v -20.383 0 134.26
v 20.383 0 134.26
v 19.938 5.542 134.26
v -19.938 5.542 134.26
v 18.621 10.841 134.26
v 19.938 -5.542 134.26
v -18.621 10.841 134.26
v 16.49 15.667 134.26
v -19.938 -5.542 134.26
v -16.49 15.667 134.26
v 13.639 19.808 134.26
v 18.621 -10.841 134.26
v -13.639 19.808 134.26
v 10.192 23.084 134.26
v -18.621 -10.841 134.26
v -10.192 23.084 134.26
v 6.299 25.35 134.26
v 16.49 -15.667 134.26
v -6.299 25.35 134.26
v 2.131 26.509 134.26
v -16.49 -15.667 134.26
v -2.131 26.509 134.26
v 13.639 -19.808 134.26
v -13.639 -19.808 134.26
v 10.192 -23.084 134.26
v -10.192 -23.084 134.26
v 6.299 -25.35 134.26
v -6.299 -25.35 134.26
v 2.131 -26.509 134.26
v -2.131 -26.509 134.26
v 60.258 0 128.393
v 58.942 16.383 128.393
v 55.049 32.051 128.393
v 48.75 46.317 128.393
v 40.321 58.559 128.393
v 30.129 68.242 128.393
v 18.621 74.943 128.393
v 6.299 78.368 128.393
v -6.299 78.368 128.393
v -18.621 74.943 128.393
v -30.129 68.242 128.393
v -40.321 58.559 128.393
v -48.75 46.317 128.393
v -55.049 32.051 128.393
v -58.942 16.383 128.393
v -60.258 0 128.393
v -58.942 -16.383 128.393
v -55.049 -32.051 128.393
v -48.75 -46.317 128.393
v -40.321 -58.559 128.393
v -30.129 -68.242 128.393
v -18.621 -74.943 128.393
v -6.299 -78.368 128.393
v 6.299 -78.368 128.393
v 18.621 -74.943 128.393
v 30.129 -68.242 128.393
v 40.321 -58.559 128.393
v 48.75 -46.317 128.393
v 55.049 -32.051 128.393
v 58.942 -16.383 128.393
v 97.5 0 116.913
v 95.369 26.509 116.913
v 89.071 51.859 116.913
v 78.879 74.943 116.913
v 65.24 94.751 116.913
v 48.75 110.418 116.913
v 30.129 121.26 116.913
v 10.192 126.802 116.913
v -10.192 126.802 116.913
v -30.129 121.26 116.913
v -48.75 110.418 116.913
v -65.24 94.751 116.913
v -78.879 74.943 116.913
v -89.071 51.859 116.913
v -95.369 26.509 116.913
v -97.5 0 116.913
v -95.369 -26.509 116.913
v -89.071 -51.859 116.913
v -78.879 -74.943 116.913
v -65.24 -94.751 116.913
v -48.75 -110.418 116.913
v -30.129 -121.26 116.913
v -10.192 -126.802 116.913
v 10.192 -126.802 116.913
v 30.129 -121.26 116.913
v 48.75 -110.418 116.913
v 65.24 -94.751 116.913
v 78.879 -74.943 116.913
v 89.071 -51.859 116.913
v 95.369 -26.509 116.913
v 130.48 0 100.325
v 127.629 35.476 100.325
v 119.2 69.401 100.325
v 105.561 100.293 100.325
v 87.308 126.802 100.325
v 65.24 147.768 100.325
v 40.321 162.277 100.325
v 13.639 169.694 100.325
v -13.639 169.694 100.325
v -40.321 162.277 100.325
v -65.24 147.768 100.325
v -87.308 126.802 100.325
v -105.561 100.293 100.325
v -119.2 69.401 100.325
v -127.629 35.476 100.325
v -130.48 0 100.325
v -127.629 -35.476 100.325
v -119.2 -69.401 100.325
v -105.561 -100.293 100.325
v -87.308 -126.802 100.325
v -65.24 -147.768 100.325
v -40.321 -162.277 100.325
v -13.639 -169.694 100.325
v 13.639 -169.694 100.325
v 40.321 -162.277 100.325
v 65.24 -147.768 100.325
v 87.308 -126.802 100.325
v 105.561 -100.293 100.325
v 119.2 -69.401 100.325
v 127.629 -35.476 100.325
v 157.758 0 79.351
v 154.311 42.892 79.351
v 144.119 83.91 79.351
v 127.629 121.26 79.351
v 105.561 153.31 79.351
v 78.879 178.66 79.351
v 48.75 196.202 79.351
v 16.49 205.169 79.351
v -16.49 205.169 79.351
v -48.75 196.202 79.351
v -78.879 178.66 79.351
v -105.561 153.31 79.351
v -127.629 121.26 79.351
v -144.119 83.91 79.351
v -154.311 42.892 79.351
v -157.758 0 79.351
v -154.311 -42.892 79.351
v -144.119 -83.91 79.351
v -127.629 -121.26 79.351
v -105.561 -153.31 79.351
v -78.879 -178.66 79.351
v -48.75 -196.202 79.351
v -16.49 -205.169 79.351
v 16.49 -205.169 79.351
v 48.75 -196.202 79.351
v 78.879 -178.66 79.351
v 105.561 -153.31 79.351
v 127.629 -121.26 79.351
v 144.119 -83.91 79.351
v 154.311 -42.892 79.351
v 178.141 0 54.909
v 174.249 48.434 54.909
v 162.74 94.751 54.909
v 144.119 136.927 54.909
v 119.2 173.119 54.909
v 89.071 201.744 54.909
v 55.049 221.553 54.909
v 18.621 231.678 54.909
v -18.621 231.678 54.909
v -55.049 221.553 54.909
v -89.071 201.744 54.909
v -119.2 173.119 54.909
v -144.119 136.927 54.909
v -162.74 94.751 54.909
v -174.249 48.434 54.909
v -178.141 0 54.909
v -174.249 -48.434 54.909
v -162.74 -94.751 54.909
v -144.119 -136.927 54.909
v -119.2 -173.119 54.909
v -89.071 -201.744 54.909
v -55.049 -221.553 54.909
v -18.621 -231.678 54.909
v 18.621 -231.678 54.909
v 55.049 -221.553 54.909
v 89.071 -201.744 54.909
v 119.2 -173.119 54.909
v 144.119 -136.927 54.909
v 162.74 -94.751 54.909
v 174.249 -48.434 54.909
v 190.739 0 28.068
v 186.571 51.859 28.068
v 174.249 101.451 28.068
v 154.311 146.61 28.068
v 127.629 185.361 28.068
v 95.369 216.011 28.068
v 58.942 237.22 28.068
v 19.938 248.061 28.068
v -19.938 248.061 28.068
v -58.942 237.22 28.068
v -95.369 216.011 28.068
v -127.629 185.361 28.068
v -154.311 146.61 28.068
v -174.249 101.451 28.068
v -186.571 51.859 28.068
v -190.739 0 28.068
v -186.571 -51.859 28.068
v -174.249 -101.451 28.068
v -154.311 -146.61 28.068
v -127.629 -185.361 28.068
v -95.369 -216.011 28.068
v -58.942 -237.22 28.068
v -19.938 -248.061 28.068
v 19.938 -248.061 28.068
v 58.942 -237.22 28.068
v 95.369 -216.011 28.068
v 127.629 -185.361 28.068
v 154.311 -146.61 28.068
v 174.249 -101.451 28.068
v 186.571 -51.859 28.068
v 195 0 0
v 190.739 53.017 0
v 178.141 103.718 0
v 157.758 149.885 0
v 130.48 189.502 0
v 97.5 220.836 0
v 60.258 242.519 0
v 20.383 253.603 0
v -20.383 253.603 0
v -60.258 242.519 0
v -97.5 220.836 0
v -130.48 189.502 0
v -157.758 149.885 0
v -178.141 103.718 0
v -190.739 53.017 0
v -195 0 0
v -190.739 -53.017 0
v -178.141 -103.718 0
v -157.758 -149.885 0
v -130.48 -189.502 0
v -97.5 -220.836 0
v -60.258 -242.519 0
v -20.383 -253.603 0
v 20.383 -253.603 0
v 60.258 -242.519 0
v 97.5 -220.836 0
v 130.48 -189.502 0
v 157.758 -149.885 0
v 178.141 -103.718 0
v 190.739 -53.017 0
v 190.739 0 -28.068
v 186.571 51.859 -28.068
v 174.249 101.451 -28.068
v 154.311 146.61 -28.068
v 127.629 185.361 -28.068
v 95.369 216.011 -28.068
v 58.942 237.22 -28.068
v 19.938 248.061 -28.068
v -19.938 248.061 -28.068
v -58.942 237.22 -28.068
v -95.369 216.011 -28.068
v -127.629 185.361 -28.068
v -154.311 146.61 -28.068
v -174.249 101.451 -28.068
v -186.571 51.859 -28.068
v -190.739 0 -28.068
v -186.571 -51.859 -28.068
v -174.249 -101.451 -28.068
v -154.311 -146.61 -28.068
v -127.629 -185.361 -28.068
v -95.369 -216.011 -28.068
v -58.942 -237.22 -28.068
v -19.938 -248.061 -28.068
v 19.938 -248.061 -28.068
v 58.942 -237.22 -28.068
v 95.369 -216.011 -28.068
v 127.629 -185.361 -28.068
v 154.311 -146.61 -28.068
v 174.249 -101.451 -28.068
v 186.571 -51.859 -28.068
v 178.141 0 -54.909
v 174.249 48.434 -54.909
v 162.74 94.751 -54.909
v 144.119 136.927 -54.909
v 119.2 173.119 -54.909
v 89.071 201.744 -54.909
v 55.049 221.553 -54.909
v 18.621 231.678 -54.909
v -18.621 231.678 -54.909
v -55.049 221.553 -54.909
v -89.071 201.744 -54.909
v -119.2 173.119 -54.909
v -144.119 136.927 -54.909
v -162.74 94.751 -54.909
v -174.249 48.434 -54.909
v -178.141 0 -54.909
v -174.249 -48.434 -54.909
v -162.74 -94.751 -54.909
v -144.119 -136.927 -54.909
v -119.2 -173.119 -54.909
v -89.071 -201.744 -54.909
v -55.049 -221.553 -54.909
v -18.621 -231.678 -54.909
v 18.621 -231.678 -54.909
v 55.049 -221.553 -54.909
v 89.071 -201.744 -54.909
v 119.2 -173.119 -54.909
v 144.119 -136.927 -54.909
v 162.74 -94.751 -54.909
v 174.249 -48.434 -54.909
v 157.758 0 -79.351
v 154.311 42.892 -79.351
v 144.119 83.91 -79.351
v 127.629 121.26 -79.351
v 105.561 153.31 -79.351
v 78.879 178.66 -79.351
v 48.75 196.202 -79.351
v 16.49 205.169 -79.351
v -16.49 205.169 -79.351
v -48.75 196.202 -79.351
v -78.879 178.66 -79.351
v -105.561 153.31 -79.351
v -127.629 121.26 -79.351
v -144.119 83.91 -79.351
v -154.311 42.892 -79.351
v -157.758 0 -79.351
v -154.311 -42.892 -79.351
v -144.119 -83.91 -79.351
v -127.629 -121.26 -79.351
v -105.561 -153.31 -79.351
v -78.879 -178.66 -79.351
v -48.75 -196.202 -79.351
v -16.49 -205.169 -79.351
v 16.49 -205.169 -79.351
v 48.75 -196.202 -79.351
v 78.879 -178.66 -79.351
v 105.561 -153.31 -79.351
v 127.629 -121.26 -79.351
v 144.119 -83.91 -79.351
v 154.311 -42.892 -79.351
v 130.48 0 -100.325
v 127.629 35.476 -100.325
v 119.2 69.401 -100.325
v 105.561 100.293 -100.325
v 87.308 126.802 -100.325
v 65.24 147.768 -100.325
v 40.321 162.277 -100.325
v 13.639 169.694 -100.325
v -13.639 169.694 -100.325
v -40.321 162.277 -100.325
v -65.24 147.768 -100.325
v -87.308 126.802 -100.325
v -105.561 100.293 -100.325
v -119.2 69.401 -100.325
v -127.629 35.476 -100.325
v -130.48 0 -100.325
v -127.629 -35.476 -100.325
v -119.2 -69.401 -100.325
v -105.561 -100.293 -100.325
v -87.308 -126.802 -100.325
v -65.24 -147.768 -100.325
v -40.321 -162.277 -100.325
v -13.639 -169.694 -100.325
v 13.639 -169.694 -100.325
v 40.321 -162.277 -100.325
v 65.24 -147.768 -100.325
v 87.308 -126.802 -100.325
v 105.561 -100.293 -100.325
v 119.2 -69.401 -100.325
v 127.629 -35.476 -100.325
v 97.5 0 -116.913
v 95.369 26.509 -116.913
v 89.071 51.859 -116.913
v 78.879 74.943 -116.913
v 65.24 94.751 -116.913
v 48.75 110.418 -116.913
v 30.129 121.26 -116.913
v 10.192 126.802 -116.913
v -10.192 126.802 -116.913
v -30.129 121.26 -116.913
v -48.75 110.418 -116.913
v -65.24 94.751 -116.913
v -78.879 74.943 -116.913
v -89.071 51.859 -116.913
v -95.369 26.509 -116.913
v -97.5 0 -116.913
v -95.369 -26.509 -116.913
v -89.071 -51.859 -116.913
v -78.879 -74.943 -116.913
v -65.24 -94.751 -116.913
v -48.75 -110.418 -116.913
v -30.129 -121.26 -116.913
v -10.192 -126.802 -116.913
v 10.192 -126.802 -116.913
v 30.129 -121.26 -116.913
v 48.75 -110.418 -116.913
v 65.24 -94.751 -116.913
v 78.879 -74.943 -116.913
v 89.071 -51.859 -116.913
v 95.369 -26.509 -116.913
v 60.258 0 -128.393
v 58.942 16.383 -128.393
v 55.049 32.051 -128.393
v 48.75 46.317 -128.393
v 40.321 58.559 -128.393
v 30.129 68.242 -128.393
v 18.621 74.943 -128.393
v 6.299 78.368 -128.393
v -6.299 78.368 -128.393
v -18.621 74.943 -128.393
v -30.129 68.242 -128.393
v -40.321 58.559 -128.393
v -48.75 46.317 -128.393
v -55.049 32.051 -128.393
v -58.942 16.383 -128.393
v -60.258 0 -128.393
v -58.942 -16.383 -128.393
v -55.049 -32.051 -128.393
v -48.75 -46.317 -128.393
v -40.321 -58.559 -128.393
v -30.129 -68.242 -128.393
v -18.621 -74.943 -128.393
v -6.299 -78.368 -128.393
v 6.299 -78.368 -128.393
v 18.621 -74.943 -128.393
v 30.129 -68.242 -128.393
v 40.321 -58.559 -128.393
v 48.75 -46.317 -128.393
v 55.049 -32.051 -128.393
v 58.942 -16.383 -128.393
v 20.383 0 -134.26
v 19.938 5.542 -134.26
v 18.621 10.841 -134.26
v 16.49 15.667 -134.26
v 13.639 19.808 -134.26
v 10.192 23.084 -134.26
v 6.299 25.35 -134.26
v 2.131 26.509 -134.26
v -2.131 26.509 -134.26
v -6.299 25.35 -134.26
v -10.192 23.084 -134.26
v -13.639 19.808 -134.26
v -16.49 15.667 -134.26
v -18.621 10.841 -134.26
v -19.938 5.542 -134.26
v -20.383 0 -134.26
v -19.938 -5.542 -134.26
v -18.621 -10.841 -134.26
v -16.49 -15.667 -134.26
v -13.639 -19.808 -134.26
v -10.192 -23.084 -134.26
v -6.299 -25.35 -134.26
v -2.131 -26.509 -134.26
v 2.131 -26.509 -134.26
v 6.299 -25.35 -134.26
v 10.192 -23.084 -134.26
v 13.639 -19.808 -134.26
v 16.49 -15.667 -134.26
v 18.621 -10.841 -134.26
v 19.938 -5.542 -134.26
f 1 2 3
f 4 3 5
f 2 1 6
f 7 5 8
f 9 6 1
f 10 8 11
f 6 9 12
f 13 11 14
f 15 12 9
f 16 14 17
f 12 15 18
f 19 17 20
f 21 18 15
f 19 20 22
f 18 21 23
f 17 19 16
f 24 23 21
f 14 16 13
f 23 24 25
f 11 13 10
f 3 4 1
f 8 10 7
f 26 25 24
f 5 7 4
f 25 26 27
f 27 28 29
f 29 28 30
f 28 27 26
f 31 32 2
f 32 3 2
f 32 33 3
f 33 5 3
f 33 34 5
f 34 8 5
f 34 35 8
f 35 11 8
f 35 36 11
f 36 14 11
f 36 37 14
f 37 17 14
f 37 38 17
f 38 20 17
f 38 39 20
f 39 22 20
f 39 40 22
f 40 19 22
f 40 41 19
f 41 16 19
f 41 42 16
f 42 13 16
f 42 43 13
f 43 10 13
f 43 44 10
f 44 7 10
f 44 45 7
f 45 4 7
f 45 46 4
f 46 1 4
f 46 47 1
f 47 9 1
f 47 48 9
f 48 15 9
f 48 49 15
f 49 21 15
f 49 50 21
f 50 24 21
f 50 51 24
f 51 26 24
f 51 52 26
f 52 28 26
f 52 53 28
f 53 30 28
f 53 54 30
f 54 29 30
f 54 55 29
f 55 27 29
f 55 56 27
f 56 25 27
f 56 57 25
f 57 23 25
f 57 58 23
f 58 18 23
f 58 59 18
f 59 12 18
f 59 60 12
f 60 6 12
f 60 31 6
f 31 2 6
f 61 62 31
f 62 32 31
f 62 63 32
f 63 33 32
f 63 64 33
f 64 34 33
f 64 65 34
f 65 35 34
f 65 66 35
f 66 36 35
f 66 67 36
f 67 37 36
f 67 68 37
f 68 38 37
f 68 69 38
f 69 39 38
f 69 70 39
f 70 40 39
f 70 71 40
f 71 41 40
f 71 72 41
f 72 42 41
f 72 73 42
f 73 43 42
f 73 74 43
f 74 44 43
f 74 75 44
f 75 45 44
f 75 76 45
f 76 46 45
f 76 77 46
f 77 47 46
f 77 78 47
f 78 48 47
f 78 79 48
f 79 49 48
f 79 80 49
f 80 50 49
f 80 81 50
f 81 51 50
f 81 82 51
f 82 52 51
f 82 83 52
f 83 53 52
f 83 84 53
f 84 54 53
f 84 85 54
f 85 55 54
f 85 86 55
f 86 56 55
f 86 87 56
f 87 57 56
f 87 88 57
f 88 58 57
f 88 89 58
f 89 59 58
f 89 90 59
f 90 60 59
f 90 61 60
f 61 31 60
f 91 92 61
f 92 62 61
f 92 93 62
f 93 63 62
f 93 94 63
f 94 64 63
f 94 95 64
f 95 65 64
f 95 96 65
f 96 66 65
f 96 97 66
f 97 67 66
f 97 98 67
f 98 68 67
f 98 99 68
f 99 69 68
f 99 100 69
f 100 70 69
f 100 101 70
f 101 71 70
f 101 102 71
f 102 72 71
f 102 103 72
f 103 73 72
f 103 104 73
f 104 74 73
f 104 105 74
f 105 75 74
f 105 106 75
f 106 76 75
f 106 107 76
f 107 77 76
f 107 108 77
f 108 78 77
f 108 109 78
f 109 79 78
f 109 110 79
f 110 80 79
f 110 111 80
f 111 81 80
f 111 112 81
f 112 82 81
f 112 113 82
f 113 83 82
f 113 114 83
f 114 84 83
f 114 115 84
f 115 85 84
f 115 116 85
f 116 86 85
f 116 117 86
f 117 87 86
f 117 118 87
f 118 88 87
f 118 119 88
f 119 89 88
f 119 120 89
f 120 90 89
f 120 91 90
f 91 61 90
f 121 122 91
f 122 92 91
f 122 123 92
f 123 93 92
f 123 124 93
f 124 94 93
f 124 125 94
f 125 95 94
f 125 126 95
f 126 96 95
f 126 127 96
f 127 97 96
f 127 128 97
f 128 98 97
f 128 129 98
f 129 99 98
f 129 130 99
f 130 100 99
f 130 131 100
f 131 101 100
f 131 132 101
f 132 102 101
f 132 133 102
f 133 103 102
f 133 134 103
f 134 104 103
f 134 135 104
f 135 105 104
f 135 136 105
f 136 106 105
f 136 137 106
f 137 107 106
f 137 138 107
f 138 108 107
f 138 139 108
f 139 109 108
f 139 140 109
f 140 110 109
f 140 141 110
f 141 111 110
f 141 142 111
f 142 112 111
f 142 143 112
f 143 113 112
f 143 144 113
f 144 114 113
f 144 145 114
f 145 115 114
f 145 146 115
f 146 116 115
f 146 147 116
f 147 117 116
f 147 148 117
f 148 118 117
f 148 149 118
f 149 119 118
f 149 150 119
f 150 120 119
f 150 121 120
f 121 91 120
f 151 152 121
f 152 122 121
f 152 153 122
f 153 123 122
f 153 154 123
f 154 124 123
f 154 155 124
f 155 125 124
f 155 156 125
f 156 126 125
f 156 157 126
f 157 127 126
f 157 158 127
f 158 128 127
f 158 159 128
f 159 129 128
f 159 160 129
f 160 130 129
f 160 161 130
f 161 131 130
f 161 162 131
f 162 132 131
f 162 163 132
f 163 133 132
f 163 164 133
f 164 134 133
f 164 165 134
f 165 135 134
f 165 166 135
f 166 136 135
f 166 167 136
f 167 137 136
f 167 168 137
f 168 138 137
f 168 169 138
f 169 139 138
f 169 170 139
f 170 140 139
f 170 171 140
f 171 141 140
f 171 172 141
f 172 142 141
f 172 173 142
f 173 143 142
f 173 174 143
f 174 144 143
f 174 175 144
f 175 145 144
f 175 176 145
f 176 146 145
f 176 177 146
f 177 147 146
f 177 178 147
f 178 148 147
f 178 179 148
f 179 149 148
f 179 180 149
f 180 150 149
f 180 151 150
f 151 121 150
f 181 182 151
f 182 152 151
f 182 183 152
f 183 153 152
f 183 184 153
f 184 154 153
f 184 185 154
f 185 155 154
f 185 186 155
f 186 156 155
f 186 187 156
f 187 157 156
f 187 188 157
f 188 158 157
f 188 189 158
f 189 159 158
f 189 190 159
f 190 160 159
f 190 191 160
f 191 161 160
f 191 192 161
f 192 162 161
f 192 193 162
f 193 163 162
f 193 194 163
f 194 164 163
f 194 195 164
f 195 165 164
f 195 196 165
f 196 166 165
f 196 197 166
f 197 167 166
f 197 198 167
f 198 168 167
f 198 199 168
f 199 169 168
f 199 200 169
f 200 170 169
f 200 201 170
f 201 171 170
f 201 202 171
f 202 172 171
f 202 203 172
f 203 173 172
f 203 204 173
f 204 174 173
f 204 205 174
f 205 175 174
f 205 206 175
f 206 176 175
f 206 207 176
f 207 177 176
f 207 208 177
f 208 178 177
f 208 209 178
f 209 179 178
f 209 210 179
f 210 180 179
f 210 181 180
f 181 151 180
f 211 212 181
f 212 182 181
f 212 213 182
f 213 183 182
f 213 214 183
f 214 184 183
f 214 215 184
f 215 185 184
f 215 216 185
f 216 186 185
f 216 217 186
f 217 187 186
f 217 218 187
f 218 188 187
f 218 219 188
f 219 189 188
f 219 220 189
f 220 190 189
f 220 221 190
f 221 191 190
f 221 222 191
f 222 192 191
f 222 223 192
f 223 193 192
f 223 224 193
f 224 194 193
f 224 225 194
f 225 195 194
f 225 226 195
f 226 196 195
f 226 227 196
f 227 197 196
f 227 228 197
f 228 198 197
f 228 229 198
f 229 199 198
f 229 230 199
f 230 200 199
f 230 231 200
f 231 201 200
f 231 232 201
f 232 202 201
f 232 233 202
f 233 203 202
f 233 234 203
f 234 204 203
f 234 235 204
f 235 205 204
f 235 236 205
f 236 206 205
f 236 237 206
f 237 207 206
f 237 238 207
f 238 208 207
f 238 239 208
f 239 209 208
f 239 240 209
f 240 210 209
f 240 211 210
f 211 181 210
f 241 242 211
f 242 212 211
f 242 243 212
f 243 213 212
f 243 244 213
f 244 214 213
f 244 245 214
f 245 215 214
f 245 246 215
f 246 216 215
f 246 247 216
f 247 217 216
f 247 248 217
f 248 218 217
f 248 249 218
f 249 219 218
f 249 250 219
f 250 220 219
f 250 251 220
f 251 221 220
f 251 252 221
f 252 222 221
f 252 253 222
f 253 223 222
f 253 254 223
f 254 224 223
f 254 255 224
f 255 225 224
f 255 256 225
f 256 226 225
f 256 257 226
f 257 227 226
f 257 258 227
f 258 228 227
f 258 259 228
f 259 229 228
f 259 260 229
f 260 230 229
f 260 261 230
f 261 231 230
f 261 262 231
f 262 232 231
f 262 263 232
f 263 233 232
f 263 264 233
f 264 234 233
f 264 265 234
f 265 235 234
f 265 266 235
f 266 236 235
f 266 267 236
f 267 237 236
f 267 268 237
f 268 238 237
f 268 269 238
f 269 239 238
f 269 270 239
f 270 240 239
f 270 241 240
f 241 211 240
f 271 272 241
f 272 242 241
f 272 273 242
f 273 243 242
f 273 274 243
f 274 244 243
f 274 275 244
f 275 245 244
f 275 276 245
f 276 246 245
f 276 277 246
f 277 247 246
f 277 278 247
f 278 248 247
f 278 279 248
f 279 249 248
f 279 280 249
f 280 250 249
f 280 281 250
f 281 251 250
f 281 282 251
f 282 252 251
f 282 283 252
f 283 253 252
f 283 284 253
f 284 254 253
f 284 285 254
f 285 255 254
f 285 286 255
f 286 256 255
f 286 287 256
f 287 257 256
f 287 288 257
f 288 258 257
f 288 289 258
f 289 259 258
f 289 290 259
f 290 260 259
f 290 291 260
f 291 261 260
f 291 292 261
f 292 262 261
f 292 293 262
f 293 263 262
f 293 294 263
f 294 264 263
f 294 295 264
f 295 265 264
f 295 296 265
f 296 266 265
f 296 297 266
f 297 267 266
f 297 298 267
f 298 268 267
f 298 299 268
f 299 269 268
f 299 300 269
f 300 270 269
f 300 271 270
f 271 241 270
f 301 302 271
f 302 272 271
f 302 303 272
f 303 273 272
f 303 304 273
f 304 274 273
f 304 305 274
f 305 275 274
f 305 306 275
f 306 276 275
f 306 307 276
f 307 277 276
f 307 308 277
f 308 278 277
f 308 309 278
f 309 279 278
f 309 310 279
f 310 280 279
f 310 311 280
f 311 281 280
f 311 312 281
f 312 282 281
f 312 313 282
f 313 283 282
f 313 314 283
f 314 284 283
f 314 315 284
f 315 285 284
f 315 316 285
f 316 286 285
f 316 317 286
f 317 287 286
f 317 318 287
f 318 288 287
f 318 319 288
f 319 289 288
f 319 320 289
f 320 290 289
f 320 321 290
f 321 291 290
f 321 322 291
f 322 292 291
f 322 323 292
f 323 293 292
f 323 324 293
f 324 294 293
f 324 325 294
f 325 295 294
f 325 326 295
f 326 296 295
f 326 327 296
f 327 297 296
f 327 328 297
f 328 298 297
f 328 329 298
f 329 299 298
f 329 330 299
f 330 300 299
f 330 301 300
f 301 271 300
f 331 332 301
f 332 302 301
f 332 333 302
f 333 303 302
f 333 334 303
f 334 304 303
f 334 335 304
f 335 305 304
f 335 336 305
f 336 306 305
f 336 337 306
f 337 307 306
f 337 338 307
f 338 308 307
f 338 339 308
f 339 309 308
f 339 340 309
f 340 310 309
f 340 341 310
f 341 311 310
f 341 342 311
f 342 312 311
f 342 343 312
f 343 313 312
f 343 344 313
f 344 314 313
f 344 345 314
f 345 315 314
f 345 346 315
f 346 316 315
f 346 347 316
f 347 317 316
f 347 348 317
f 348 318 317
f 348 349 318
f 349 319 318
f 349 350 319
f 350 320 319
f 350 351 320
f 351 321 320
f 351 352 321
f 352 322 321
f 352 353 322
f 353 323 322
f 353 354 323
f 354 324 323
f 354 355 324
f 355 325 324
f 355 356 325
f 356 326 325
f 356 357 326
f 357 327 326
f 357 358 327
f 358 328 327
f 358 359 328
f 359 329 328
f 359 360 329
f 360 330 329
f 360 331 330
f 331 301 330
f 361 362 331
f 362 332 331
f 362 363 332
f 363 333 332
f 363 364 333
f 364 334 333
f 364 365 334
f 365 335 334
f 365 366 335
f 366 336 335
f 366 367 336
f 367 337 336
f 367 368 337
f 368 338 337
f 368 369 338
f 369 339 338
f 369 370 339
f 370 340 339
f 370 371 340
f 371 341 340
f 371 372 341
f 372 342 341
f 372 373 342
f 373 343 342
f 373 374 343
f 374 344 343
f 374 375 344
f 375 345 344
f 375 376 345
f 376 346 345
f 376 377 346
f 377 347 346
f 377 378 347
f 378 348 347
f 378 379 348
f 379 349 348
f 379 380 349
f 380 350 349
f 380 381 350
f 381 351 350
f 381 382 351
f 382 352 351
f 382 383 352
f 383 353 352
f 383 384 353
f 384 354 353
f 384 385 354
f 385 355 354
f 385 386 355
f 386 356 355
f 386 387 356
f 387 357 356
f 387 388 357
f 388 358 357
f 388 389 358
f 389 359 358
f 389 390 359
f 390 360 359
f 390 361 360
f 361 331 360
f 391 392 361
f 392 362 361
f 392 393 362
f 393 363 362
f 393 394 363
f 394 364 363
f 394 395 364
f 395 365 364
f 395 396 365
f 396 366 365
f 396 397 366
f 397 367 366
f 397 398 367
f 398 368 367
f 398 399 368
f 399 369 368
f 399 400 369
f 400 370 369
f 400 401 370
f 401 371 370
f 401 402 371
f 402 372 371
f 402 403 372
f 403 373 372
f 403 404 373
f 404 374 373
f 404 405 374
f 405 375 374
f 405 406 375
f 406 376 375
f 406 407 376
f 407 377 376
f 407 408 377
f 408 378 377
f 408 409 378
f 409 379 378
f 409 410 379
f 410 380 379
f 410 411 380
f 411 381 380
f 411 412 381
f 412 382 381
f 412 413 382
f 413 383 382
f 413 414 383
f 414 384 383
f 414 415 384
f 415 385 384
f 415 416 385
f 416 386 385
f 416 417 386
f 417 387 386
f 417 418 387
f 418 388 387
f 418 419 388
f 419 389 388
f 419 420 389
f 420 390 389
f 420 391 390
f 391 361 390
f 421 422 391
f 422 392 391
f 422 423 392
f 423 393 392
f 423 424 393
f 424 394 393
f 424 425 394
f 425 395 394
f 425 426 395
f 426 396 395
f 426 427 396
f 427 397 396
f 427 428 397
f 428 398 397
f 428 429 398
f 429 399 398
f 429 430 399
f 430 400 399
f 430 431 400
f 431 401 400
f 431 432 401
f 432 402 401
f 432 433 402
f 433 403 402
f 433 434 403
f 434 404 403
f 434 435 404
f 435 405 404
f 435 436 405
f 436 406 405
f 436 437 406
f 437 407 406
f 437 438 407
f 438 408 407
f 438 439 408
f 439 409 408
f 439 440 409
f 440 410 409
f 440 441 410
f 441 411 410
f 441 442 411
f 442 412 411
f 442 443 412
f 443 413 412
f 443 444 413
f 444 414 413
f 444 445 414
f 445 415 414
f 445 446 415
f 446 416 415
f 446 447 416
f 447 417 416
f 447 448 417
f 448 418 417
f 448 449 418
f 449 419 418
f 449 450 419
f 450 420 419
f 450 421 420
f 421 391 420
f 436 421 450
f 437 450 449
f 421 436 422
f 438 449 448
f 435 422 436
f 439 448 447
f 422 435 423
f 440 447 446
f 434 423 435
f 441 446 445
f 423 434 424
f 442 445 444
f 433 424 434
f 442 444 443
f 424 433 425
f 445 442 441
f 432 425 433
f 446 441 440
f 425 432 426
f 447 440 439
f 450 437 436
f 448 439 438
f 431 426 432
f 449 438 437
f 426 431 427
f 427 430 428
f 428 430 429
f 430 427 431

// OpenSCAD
// Generated by SolidPython 1.0.1 on 2020-07-29 00:46:51


scale(v = [13, 17, 9]) {
	sphere(r = 15);
}
/***********************************************
*********      SolidPython code:      **********
************************************************
 
# import packages: SolidPython
from solid import *
from solid.utils import *
from itertools import chain, combinations, permutations


class Resize:

    def __init__(self, scad_file):
        self.scad_file = scad_file
        #self.scad_file = import_scad(scad_file)
        # cone/cylinder param:
        self.r1 = 0
        self.r2 = 0
        self.h = 0
        # rectangular prism param:
        self.w = 0
        self.l = 0
        # ellipse param:
        self.r = 0

    # import OpenScad code (file name corresponds to shape)


    # classify shape + parameters
    def assign(self, param1, param2, param3):
        if self.scad_file == 'cone.scad':
            self.r1 = param1
            self.r2 = param2
            self.h = param3
        elif self.scad_file == 'cylinder.scad':
            self.r1 = param1
            self.r2 = param2
            self.h = param3
        elif self.scad_file == 'rectangularPrism.scad':
            self.h = param1
            self.l = param2
            self.w = param3
        else:
            self.r = param1
            self.h = param2

    # resize parameters
    def iterate(self):
        x = range(3, 20, 2)
        i = 1
        if self.scad_file == 'cone.scad':
            tempList = list(permutations(x, 2))
            for temp in tempList:
                param1 = temp[0]
                param2 = temp[1]
                filepath = 'produced_scad_files/' + 'cone' + str(param1) + '_' + str(param2) + '_' + '.scad'
                scad_render_to_file(cylinder(h=param1, r1=param2, r2=0), filepath)

        elif self.scad_file == 'cylinder.scad':
            tempList = list(permutations(x, 3))
            for temp in tempList:
                param1 = temp[0]
                param2 = temp[1]
                filepath = 'produced_scad_files/' + 'cylinder' + str(param1) + '_' + str(param2) + '_' + '.scad'
                scad_render_to_file(cylinder(h=param1, r1=param2, r2=param2), filepath)

        elif self.scad_file == 'rectangularPrism.scad':
            tempList = list(permutations(x, 3))
            for temp in tempList:
                param1 = temp[0]
                param2 = temp[1]
                param3 = temp[2]
                filepath = 'produced_scad_files/' + 'rectangularPrism' + str(param1) + '_' + str(param2) + '_' + str(
                    param3) + '.scad'
                scad_render_to_file(cube(size=(param1, param2, param3)), filepath)

        elif self.scad_file == 'ellipse.scad':
            tempList = list(permutations(x, 4))
            for temp in tempList:
                param1 = temp[0]
                param2 = temp[1]
                param3 = temp[2]
                param4 = temp[3]
                filepath = 'produced_scad_files/' + 'ellipse' + str(param1) + '_' + str(param2) + '_' + str(param3) + '_' + str(param4) + '.scad'
                scad_render_to_file(scale([param1, param2, param3])(sphere(r=param4)), filepath)

    def render_to_scadfile(self):
        scad_render_to_file(scad, 'example.scad') 
 
************************************************/
